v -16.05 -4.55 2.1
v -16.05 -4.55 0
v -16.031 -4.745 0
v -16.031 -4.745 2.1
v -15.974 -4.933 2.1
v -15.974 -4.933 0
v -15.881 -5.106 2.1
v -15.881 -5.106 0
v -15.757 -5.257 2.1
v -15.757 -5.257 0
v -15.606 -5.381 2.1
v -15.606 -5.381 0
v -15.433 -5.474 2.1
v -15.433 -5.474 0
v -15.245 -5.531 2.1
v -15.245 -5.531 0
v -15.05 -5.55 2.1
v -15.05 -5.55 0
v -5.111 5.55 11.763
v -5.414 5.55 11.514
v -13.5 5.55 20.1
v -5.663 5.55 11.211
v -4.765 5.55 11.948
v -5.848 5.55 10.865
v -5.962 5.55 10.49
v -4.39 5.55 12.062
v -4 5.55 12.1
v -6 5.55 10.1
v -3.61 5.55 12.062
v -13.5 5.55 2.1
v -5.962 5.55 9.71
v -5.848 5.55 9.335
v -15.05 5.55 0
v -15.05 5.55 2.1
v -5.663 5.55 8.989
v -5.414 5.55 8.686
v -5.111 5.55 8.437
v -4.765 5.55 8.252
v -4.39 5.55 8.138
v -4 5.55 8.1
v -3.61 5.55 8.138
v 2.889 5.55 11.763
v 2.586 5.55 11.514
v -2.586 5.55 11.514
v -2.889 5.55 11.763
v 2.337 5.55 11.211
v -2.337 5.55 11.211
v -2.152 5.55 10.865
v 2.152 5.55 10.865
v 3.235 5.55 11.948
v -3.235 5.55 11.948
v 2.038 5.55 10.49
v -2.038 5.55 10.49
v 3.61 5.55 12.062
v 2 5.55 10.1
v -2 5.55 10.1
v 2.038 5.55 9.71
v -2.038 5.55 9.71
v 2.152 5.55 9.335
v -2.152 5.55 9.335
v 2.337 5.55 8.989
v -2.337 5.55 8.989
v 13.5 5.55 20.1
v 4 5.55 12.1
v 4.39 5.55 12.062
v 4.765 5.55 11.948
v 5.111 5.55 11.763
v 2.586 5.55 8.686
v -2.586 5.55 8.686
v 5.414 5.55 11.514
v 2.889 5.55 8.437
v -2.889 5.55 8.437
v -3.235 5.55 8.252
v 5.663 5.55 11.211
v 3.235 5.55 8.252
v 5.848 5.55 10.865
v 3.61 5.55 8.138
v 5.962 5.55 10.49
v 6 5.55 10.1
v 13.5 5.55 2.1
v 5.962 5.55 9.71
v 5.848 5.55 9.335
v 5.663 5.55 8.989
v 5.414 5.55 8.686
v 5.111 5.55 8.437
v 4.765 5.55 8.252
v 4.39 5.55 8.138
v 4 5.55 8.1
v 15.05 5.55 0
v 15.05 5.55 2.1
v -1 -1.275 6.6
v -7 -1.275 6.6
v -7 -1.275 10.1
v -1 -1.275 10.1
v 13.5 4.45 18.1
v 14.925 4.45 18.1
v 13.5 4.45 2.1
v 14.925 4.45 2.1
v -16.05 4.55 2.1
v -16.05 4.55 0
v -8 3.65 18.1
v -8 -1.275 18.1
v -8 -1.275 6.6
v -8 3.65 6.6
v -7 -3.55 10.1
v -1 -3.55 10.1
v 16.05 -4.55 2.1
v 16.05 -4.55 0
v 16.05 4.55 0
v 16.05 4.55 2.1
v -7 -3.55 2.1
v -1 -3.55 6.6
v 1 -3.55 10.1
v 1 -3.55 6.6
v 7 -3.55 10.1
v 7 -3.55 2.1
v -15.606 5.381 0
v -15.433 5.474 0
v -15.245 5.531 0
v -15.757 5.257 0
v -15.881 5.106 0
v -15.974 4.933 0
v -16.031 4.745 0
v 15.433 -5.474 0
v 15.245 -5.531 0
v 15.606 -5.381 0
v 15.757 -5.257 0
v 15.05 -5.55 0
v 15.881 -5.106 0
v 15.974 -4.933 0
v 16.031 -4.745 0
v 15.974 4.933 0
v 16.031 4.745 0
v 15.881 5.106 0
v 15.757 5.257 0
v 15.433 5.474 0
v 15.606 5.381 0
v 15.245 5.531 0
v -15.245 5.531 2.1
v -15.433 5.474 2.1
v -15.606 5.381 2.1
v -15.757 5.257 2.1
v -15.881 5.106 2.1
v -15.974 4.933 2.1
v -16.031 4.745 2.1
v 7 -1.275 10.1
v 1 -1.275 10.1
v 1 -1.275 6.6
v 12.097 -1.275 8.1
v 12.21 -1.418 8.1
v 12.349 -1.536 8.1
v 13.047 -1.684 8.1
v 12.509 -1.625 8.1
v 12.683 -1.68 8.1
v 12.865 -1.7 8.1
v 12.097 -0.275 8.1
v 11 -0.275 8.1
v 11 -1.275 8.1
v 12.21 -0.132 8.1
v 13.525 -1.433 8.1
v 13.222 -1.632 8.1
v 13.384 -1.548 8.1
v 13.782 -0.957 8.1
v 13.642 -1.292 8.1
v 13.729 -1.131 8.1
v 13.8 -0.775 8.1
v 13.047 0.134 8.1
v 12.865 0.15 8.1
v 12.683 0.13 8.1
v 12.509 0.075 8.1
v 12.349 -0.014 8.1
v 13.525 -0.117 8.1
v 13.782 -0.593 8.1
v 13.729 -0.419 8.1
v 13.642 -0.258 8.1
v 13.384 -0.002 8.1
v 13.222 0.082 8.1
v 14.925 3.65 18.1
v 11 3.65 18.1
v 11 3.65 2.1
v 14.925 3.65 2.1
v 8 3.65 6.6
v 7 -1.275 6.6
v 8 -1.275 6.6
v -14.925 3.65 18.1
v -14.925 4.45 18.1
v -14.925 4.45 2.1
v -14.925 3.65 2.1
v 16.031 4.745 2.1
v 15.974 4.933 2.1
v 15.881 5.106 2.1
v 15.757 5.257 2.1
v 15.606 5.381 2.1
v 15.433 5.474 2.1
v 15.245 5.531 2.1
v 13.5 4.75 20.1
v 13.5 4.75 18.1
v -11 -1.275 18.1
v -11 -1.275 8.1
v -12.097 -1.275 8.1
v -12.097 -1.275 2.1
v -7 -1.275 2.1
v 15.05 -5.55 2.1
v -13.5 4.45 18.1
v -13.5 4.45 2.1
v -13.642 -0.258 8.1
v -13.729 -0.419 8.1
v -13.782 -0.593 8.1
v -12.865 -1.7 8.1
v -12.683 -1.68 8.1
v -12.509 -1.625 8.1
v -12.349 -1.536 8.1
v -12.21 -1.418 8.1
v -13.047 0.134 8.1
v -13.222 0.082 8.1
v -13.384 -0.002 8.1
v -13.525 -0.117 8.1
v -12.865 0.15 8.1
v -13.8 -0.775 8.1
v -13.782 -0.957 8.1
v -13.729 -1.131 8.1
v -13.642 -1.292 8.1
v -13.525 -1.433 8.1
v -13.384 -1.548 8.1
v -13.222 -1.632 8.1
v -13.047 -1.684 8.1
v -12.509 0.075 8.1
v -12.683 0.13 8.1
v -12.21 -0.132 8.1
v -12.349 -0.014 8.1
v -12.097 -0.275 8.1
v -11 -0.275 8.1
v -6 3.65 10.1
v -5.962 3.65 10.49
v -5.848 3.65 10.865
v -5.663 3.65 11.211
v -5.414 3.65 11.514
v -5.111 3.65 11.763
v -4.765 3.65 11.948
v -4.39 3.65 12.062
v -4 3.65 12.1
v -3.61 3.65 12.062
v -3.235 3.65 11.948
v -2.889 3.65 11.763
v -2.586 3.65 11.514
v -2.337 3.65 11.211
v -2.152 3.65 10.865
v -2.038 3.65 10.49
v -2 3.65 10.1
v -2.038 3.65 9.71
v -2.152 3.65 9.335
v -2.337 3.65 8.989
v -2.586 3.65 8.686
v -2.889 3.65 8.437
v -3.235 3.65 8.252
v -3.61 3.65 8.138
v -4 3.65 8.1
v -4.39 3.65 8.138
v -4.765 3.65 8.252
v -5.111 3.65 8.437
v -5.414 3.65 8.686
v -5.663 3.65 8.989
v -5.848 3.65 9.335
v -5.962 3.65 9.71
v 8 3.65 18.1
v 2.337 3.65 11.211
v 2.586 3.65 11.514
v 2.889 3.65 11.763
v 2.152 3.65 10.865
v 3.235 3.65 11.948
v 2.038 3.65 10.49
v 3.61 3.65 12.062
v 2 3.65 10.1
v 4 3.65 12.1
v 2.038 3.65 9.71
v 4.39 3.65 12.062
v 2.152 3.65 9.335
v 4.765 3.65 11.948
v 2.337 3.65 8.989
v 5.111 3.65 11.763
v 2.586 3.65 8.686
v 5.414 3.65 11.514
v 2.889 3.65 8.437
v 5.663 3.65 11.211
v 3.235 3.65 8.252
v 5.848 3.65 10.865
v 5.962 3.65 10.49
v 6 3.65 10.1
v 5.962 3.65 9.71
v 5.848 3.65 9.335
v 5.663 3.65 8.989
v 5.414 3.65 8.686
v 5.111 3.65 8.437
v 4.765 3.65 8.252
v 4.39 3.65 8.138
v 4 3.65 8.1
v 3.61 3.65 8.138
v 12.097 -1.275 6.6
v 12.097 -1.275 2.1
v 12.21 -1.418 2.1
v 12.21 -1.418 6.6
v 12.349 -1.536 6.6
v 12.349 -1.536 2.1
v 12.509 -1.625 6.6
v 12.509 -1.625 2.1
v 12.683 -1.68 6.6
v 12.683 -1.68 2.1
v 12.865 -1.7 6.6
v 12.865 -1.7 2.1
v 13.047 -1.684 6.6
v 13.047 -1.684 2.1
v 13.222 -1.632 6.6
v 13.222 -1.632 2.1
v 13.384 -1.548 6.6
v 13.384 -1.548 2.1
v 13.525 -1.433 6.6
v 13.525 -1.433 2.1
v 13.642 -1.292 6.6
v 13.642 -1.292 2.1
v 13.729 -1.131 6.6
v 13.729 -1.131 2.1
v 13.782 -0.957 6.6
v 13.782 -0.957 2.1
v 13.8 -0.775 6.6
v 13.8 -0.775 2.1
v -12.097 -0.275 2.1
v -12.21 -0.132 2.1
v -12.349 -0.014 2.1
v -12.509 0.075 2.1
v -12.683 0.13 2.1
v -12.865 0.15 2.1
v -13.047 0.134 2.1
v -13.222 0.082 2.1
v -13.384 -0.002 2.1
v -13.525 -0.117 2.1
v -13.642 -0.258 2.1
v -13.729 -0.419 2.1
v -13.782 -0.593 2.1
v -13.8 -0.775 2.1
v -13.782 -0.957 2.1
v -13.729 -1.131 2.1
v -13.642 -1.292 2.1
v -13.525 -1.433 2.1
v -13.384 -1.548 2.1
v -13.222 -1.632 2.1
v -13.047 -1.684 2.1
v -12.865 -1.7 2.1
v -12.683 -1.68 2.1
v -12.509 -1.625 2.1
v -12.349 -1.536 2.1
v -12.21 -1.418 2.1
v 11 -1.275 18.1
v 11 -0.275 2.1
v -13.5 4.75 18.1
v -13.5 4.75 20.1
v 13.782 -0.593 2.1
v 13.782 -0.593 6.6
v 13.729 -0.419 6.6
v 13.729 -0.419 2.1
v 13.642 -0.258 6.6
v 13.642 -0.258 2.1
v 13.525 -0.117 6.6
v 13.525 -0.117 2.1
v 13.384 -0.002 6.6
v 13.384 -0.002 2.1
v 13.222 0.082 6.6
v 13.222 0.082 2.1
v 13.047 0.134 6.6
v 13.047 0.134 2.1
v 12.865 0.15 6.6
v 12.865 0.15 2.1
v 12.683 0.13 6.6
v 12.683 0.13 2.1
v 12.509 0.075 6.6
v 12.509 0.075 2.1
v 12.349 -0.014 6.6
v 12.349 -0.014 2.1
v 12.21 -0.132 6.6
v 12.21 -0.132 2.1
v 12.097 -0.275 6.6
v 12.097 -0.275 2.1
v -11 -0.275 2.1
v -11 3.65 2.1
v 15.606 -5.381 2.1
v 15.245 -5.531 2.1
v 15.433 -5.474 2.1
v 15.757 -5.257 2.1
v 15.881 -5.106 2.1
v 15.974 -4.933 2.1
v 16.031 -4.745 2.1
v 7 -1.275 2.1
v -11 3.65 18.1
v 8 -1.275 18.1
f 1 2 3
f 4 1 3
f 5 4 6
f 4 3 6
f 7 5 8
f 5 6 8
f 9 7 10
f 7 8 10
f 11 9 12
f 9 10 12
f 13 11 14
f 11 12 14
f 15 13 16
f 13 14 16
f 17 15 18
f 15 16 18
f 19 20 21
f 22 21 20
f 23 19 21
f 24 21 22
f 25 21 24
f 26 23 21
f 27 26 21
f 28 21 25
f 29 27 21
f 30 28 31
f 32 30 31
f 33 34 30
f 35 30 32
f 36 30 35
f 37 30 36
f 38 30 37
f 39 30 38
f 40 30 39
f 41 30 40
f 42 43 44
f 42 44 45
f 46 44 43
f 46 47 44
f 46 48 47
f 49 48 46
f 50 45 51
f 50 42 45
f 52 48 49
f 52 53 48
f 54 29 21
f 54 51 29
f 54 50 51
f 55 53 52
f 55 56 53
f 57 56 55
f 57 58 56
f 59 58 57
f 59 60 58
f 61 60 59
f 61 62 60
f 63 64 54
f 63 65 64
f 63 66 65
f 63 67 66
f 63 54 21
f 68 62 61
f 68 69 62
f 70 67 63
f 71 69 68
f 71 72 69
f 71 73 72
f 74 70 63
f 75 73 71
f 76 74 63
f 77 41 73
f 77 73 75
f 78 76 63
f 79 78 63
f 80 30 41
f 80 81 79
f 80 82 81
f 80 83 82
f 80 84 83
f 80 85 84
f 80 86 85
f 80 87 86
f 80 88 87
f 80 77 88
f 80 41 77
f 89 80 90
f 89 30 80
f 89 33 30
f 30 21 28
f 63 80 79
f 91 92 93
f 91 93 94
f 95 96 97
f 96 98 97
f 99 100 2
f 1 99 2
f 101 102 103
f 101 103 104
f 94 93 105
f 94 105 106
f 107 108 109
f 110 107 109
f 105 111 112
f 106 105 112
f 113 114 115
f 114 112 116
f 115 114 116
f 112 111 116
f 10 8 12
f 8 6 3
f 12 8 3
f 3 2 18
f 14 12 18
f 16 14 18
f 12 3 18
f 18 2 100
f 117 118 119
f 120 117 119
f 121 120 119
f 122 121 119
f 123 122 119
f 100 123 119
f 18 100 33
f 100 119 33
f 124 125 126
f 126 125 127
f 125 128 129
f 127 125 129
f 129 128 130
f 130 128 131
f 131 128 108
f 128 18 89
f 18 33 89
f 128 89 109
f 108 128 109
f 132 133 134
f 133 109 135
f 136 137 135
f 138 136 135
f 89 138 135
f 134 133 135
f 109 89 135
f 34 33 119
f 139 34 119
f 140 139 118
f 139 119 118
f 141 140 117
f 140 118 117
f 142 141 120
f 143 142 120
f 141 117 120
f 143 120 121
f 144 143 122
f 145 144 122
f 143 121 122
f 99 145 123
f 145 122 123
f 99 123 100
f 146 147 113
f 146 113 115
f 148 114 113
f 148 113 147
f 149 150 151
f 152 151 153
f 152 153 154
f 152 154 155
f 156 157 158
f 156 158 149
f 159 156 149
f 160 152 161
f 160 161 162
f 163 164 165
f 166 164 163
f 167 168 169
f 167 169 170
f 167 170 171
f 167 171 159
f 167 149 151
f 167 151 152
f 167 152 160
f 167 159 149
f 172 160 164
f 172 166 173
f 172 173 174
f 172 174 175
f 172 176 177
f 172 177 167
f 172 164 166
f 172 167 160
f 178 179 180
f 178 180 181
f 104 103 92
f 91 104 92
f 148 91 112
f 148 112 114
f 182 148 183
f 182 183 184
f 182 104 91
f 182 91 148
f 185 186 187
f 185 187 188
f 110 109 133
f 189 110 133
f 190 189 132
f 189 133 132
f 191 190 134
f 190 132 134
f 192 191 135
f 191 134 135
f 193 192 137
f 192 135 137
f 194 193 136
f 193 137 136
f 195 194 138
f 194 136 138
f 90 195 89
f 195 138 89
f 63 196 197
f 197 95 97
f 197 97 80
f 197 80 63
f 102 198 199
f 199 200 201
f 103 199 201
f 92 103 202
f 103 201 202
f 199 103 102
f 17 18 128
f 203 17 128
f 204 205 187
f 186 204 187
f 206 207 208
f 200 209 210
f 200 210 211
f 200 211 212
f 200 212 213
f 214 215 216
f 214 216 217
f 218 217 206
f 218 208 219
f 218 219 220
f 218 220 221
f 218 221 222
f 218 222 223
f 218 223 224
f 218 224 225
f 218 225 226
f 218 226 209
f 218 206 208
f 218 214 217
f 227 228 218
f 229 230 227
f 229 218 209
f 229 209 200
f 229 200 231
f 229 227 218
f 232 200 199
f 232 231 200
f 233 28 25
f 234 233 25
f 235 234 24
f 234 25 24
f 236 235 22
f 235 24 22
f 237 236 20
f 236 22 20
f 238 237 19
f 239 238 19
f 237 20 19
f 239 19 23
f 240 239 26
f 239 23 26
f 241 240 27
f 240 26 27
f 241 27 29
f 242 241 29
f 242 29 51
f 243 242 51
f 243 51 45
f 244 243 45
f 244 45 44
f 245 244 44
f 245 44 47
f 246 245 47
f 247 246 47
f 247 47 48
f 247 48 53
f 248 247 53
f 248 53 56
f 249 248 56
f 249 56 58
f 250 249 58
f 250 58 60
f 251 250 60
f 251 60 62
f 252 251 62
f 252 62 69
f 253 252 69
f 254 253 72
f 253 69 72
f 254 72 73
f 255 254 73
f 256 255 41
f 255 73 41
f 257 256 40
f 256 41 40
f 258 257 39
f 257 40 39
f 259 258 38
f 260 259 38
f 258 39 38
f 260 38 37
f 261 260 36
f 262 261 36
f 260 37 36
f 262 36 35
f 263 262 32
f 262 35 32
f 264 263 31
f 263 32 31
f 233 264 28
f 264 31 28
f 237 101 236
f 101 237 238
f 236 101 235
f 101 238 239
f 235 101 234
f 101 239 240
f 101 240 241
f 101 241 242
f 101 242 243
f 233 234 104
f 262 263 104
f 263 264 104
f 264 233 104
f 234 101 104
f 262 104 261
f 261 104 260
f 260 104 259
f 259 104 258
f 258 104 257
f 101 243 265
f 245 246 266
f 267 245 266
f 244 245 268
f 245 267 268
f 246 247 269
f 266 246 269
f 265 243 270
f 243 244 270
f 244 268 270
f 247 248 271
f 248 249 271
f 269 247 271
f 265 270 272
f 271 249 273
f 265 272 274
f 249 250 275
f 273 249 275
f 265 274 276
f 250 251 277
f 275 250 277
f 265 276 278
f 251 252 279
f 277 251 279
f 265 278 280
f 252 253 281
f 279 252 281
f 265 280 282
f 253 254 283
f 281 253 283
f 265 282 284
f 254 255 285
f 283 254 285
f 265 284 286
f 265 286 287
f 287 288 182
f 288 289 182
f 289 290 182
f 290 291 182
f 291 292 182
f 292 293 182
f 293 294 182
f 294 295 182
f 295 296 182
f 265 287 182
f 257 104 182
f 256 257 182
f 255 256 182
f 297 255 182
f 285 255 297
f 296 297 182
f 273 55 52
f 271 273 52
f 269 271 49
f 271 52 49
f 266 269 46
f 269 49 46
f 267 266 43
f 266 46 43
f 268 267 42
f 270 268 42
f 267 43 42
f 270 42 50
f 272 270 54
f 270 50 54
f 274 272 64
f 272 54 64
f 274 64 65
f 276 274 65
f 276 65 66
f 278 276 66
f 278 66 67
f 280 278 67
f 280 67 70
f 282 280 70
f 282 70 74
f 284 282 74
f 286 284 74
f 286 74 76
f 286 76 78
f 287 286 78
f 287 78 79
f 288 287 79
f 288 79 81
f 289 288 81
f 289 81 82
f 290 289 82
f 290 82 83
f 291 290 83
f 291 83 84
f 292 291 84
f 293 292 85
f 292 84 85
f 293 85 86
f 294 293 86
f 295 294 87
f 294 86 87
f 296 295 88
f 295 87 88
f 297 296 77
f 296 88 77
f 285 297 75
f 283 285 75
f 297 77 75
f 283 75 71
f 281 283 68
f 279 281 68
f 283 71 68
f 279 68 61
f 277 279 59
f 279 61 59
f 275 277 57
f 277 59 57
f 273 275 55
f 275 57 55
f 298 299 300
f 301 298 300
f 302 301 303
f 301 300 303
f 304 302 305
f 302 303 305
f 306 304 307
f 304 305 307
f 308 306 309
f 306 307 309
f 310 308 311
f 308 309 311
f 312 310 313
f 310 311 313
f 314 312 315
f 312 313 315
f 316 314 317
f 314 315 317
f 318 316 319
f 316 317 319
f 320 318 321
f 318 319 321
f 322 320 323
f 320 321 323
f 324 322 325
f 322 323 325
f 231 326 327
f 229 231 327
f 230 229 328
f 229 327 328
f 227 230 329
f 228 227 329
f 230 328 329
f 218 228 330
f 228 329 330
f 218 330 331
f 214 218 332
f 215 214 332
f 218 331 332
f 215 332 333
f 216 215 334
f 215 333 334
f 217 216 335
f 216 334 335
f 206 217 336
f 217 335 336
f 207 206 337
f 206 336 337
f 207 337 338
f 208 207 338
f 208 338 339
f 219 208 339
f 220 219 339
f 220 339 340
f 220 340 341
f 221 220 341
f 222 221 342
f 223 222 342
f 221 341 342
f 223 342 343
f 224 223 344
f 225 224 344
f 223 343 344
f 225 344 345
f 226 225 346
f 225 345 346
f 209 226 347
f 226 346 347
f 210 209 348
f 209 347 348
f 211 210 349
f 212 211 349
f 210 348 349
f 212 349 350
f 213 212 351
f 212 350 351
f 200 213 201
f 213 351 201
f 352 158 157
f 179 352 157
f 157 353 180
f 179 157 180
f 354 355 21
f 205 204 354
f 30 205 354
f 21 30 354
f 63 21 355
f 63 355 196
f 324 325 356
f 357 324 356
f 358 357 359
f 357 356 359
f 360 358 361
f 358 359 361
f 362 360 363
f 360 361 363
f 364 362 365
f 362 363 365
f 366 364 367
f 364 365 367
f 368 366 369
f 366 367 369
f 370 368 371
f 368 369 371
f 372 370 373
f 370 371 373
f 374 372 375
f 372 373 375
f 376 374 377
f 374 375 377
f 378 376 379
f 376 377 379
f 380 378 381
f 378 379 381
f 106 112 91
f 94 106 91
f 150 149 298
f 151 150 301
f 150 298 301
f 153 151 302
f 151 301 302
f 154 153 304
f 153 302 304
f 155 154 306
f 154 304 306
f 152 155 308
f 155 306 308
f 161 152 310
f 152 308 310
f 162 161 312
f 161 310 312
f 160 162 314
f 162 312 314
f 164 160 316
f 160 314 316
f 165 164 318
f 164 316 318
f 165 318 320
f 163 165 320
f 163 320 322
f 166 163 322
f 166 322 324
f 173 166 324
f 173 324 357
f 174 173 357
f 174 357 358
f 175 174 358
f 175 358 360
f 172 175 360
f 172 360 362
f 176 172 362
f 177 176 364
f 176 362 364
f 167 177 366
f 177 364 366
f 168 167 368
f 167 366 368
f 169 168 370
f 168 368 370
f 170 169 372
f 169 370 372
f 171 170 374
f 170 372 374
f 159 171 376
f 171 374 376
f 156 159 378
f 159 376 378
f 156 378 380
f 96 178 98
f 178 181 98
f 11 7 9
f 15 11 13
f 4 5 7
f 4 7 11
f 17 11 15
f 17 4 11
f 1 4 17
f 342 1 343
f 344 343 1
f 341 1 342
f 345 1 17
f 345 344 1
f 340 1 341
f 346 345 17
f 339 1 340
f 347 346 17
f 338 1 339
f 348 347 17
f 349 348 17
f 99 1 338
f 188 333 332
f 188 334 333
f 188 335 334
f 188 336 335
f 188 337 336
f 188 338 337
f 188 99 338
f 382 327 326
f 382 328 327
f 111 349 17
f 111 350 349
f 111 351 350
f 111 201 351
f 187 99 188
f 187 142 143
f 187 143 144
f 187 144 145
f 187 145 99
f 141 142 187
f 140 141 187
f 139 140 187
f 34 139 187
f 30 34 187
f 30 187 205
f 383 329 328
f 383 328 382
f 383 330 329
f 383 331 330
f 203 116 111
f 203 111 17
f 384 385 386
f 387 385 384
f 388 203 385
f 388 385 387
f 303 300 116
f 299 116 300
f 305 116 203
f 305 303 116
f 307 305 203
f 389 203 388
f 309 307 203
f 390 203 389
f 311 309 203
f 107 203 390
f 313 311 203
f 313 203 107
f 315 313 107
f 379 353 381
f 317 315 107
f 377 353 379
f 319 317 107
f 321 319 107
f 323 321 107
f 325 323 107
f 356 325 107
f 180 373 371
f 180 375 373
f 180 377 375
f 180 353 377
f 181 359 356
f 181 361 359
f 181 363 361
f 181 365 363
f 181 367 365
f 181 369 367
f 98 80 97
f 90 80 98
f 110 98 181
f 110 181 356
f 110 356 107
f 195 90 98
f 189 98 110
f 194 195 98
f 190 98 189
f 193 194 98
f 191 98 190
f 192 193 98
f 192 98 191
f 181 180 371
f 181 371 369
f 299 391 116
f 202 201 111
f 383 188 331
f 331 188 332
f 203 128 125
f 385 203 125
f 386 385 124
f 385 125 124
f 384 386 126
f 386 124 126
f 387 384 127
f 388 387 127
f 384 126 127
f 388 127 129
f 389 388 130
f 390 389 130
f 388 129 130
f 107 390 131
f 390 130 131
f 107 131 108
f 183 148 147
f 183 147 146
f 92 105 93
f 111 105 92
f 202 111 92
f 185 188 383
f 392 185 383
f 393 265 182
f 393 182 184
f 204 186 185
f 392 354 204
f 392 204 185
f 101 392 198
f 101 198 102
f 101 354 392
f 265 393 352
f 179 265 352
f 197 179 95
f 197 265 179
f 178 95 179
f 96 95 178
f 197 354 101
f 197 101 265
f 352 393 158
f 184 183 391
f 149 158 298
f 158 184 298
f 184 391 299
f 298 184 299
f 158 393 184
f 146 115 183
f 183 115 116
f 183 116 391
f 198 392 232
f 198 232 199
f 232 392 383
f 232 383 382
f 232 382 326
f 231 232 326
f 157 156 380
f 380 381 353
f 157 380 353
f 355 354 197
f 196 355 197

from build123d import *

# Parameters (mm, degrees)
F1_DEPTH  = 2.1
F2_W      = 27
F2_H      = 1.1
F3_DEPTH  = 4.5
F4_DEPTH  = 11.5
F5_R      = 2
F6_DEPTH  = 25
F7_W      = 22
F7_H      = 3.925
F8_DEPTH  = 4.5
F10_DEPTH = 11.5
F11_W     = 6
F11_H     = 2.275
F12_DEPTH = 8
F13_W     = 27
F13_H     = 0.8
F14_DEPTH = 2
F15_W     = 2
F15_H     = 2.275
F16_DEPTH = 4.5
F18_DEPTH = 10


with BuildPart() as f1:
    # F0 (on Top) → F1 (new body)
    with BuildSketch(Plane.XY):
        with BuildLine():
            Line((15.05, 5.55), (-15.05, 5.55))
            ThreePointArc((-15.05, 5.55), (-15.7571067812, 5.2571067812), (-16.05, 4.55))
            Line((-16.05, 4.55), (-16.05, -4.55))
            ThreePointArc((-16.05, -4.55), (-15.7571067812, -5.2571067812), (-15.05, -5.55))
            Line((-15.05, -5.55), (15.05, -5.55))
            ThreePointArc((15.05, -5.55), (15.7571067812, -5.2571067812), (16.05, -4.55))
            Line((16.05, -4.55), (16.05, 4.55))
            ThreePointArc((16.05, 4.55), (15.7571067812, 5.2571067812), (15.05, 5.55))
        make_face()
    extrude(amount=F1_DEPTH)

    # F2 (on face) → F3 (join)
    with BuildSketch(Plane.XY.offset(2.1)):
        with BuildLine():
            ThreePointArc((13.8, -0.775), (13.1355497201, 0.1125465303), (12.0967808792, -0.275))
            Line((12.0967808792, -0.275), (12.875, -0.275))
            Line((12.875, -0.275), (12.875, -1.275))
            Line((12.875, -1.275), (12.0967808792, -1.275))
            ThreePointArc((12.0967808792, -1.275), (13.1355497201, -1.6625465303), (13.8, -0.775))
        make_face()
        with BuildLine():
            ThreePointArc((-12.0967808792, -0.275), (-11.9874534697, -0.5144502799), (-11.95, -0.775))
            ThreePointArc((-11.95, -0.775), (-11.9874534697, -1.0355497201), (-12.0967808792, -1.275))
            Line((-12.0967808792, -1.275), (12.0967808792, -1.275))
            ThreePointArc((12.0967808792, -1.275), (11.95, -0.775), (12.0967808792, -0.275))
            Line((12.0967808792, -0.275), (-12.0967808792, -0.275))
        make_face()
        with BuildLine():
            Line((12.875, -0.275), (12.0967808792, -0.275))
            ThreePointArc((12.0967808792, -0.275), (11.95, -0.775), (12.0967808792, -1.275))
            Line((12.0967808792, -1.275), (12.875, -1.275))
            Line((12.875, -1.275), (12.875, -0.275))
        make_face()
        with BuildLine():
            Line((-12.875, -0.275), (-12.0967808792, -0.275))
            ThreePointArc((-12.0967808792, -0.275), (-13.8, -0.775), (-12.0967808792, -1.275))
            Line((-12.0967808792, -1.275), (-12.875, -1.275))
            Line((-12.875, -1.275), (-12.875, -0.275))
        make_face()
        with BuildLine():
            ThreePointArc((-12.0967808792, -1.275), (-11.9874534697, -1.0355497201), (-11.95, -0.775))
            ThreePointArc((-11.95, -0.775), (-11.9874534697, -0.5144502799), (-12.0967808792, -0.275))
            Line((-12.0967808792, -0.275), (-12.875, -0.275))
            Line((-12.875, -0.275), (-12.875, -1.275))
            Line((-12.875, -1.275), (-12.0967808792, -1.275))
        make_face()
        Polygon((13.5, 4.45), (-13.5, 4.45), (-14.925, 4.45), (-14.925, 3.65), (14.925, 3.65), (14.925, 4.45), align=None)
        with Locations((0, 5)):
            Rectangle(F2_W, F2_H)
    extrude(amount=F3_DEPTH)

    # F4 (add): a face of the model
    f4_faces = [f1.faces().sort_by_distance(p)[0] for p in [
        (0, 4.5765957447, 6.6),
    ]]
    extrude(f4_faces, amount=F4_DEPTH)

    # F5 (on face) → F6 (cut)
    with BuildSketch(Plane(origin=(0, 5.55, 0), x_dir=(-1, 0, 0), z_dir=(0, 1, 0))):
        with Locations((4, 10.1)):
            Circle(F5_R)
        with Locations((-4, 10.1)):
            Circle(F5_R)
    extrude(amount=-F6_DEPTH, mode=Mode.SUBTRACT)

    # F7 (on face) → F8 (join, through all)
    with BuildSketch(Plane.XY.offset(2.1)):
        with Locations((0, 1.6875)):
            Rectangle(F7_W, F7_H)
    extrude(amount=F8_DEPTH)

    # F9 (on face) → F10 (join, through all)
    with BuildSketch(Plane.XY.offset(6.6)):
        with BuildLine():
            Line((-11, -0.275), (-12.0967808792, -0.275))
            ThreePointArc((-12.0967808792, -0.275), (-13.8, -0.775), (-12.0967808792, -1.275))
            Line((-12.0967808792, -1.275), (-8, -1.275))
            Line((-8, -1.275), (-8, 3.65))
            Line((-8, 3.65), (-11, 3.65))
            Line((-11, 3.65), (-11, -0.275))
        make_face()
        with BuildLine():
            Line((8, 3.65), (8, -1.275))
            Line((8, -1.275), (12.0967808792, -1.275))
            ThreePointArc((12.0967808792, -1.275), (13.8, -0.775), (12.0967808792, -0.275))
            Line((12.0967808792, -0.275), (11, -0.275))
            Line((11, -0.275), (11, 3.65))
            Line((11, 3.65), (8, 3.65))
        make_face()
    extrude(amount=F10_DEPTH)

    # F11 (on face) → F12 (join)
    with BuildSketch(Plane.XY.offset(2.1)):
        with Locations((-4, -2.4125)):
            Rectangle(F11_W, F11_H)
        with Locations((4, -2.4125)):
            Rectangle(F11_W, F11_H)
    extrude(amount=F12_DEPTH)

    # F13 (on face) → F14 (join)
    with BuildSketch(Plane.XY.offset(18.1)):
        with Locations((0, 5.15)):
            Rectangle(F13_W, F13_H)
    extrude(amount=F14_DEPTH)

    # F15 (on face) → F16 (join, through all)
    with BuildSketch(Plane.XY.offset(2.1)):
        with Locations((0, -2.4125)):
            Rectangle(F15_W, F15_H)
    extrude(amount=F16_DEPTH)

    # F17 (on face) → F18 (cut)
    with BuildSketch(Plane.XY.offset(18.1)):
        with BuildLine():
            Line((-11, -1.275), (-11, -0.275))
            Line((-11, -0.275), (-12.0967808792, -0.275))
            ThreePointArc((-12.0967808792, -0.275), (-13.8, -0.775), (-12.0967808792, -1.275))
            Line((-12.0967808792, -1.275), (-11, -1.275))
        make_face()
        with BuildLine():
            Line((12.0967808792, -0.275), (11, -0.275))
            Line((11, -0.275), (11, -1.275))
            Line((11, -1.275), (12.0967808792, -1.275))
            ThreePointArc((12.0967808792, -1.275), (13.8, -0.775), (12.0967808792, -0.275))
        make_face()
    extrude(amount=-F18_DEPTH, mode=Mode.SUBTRACT)


solid = f1.part
